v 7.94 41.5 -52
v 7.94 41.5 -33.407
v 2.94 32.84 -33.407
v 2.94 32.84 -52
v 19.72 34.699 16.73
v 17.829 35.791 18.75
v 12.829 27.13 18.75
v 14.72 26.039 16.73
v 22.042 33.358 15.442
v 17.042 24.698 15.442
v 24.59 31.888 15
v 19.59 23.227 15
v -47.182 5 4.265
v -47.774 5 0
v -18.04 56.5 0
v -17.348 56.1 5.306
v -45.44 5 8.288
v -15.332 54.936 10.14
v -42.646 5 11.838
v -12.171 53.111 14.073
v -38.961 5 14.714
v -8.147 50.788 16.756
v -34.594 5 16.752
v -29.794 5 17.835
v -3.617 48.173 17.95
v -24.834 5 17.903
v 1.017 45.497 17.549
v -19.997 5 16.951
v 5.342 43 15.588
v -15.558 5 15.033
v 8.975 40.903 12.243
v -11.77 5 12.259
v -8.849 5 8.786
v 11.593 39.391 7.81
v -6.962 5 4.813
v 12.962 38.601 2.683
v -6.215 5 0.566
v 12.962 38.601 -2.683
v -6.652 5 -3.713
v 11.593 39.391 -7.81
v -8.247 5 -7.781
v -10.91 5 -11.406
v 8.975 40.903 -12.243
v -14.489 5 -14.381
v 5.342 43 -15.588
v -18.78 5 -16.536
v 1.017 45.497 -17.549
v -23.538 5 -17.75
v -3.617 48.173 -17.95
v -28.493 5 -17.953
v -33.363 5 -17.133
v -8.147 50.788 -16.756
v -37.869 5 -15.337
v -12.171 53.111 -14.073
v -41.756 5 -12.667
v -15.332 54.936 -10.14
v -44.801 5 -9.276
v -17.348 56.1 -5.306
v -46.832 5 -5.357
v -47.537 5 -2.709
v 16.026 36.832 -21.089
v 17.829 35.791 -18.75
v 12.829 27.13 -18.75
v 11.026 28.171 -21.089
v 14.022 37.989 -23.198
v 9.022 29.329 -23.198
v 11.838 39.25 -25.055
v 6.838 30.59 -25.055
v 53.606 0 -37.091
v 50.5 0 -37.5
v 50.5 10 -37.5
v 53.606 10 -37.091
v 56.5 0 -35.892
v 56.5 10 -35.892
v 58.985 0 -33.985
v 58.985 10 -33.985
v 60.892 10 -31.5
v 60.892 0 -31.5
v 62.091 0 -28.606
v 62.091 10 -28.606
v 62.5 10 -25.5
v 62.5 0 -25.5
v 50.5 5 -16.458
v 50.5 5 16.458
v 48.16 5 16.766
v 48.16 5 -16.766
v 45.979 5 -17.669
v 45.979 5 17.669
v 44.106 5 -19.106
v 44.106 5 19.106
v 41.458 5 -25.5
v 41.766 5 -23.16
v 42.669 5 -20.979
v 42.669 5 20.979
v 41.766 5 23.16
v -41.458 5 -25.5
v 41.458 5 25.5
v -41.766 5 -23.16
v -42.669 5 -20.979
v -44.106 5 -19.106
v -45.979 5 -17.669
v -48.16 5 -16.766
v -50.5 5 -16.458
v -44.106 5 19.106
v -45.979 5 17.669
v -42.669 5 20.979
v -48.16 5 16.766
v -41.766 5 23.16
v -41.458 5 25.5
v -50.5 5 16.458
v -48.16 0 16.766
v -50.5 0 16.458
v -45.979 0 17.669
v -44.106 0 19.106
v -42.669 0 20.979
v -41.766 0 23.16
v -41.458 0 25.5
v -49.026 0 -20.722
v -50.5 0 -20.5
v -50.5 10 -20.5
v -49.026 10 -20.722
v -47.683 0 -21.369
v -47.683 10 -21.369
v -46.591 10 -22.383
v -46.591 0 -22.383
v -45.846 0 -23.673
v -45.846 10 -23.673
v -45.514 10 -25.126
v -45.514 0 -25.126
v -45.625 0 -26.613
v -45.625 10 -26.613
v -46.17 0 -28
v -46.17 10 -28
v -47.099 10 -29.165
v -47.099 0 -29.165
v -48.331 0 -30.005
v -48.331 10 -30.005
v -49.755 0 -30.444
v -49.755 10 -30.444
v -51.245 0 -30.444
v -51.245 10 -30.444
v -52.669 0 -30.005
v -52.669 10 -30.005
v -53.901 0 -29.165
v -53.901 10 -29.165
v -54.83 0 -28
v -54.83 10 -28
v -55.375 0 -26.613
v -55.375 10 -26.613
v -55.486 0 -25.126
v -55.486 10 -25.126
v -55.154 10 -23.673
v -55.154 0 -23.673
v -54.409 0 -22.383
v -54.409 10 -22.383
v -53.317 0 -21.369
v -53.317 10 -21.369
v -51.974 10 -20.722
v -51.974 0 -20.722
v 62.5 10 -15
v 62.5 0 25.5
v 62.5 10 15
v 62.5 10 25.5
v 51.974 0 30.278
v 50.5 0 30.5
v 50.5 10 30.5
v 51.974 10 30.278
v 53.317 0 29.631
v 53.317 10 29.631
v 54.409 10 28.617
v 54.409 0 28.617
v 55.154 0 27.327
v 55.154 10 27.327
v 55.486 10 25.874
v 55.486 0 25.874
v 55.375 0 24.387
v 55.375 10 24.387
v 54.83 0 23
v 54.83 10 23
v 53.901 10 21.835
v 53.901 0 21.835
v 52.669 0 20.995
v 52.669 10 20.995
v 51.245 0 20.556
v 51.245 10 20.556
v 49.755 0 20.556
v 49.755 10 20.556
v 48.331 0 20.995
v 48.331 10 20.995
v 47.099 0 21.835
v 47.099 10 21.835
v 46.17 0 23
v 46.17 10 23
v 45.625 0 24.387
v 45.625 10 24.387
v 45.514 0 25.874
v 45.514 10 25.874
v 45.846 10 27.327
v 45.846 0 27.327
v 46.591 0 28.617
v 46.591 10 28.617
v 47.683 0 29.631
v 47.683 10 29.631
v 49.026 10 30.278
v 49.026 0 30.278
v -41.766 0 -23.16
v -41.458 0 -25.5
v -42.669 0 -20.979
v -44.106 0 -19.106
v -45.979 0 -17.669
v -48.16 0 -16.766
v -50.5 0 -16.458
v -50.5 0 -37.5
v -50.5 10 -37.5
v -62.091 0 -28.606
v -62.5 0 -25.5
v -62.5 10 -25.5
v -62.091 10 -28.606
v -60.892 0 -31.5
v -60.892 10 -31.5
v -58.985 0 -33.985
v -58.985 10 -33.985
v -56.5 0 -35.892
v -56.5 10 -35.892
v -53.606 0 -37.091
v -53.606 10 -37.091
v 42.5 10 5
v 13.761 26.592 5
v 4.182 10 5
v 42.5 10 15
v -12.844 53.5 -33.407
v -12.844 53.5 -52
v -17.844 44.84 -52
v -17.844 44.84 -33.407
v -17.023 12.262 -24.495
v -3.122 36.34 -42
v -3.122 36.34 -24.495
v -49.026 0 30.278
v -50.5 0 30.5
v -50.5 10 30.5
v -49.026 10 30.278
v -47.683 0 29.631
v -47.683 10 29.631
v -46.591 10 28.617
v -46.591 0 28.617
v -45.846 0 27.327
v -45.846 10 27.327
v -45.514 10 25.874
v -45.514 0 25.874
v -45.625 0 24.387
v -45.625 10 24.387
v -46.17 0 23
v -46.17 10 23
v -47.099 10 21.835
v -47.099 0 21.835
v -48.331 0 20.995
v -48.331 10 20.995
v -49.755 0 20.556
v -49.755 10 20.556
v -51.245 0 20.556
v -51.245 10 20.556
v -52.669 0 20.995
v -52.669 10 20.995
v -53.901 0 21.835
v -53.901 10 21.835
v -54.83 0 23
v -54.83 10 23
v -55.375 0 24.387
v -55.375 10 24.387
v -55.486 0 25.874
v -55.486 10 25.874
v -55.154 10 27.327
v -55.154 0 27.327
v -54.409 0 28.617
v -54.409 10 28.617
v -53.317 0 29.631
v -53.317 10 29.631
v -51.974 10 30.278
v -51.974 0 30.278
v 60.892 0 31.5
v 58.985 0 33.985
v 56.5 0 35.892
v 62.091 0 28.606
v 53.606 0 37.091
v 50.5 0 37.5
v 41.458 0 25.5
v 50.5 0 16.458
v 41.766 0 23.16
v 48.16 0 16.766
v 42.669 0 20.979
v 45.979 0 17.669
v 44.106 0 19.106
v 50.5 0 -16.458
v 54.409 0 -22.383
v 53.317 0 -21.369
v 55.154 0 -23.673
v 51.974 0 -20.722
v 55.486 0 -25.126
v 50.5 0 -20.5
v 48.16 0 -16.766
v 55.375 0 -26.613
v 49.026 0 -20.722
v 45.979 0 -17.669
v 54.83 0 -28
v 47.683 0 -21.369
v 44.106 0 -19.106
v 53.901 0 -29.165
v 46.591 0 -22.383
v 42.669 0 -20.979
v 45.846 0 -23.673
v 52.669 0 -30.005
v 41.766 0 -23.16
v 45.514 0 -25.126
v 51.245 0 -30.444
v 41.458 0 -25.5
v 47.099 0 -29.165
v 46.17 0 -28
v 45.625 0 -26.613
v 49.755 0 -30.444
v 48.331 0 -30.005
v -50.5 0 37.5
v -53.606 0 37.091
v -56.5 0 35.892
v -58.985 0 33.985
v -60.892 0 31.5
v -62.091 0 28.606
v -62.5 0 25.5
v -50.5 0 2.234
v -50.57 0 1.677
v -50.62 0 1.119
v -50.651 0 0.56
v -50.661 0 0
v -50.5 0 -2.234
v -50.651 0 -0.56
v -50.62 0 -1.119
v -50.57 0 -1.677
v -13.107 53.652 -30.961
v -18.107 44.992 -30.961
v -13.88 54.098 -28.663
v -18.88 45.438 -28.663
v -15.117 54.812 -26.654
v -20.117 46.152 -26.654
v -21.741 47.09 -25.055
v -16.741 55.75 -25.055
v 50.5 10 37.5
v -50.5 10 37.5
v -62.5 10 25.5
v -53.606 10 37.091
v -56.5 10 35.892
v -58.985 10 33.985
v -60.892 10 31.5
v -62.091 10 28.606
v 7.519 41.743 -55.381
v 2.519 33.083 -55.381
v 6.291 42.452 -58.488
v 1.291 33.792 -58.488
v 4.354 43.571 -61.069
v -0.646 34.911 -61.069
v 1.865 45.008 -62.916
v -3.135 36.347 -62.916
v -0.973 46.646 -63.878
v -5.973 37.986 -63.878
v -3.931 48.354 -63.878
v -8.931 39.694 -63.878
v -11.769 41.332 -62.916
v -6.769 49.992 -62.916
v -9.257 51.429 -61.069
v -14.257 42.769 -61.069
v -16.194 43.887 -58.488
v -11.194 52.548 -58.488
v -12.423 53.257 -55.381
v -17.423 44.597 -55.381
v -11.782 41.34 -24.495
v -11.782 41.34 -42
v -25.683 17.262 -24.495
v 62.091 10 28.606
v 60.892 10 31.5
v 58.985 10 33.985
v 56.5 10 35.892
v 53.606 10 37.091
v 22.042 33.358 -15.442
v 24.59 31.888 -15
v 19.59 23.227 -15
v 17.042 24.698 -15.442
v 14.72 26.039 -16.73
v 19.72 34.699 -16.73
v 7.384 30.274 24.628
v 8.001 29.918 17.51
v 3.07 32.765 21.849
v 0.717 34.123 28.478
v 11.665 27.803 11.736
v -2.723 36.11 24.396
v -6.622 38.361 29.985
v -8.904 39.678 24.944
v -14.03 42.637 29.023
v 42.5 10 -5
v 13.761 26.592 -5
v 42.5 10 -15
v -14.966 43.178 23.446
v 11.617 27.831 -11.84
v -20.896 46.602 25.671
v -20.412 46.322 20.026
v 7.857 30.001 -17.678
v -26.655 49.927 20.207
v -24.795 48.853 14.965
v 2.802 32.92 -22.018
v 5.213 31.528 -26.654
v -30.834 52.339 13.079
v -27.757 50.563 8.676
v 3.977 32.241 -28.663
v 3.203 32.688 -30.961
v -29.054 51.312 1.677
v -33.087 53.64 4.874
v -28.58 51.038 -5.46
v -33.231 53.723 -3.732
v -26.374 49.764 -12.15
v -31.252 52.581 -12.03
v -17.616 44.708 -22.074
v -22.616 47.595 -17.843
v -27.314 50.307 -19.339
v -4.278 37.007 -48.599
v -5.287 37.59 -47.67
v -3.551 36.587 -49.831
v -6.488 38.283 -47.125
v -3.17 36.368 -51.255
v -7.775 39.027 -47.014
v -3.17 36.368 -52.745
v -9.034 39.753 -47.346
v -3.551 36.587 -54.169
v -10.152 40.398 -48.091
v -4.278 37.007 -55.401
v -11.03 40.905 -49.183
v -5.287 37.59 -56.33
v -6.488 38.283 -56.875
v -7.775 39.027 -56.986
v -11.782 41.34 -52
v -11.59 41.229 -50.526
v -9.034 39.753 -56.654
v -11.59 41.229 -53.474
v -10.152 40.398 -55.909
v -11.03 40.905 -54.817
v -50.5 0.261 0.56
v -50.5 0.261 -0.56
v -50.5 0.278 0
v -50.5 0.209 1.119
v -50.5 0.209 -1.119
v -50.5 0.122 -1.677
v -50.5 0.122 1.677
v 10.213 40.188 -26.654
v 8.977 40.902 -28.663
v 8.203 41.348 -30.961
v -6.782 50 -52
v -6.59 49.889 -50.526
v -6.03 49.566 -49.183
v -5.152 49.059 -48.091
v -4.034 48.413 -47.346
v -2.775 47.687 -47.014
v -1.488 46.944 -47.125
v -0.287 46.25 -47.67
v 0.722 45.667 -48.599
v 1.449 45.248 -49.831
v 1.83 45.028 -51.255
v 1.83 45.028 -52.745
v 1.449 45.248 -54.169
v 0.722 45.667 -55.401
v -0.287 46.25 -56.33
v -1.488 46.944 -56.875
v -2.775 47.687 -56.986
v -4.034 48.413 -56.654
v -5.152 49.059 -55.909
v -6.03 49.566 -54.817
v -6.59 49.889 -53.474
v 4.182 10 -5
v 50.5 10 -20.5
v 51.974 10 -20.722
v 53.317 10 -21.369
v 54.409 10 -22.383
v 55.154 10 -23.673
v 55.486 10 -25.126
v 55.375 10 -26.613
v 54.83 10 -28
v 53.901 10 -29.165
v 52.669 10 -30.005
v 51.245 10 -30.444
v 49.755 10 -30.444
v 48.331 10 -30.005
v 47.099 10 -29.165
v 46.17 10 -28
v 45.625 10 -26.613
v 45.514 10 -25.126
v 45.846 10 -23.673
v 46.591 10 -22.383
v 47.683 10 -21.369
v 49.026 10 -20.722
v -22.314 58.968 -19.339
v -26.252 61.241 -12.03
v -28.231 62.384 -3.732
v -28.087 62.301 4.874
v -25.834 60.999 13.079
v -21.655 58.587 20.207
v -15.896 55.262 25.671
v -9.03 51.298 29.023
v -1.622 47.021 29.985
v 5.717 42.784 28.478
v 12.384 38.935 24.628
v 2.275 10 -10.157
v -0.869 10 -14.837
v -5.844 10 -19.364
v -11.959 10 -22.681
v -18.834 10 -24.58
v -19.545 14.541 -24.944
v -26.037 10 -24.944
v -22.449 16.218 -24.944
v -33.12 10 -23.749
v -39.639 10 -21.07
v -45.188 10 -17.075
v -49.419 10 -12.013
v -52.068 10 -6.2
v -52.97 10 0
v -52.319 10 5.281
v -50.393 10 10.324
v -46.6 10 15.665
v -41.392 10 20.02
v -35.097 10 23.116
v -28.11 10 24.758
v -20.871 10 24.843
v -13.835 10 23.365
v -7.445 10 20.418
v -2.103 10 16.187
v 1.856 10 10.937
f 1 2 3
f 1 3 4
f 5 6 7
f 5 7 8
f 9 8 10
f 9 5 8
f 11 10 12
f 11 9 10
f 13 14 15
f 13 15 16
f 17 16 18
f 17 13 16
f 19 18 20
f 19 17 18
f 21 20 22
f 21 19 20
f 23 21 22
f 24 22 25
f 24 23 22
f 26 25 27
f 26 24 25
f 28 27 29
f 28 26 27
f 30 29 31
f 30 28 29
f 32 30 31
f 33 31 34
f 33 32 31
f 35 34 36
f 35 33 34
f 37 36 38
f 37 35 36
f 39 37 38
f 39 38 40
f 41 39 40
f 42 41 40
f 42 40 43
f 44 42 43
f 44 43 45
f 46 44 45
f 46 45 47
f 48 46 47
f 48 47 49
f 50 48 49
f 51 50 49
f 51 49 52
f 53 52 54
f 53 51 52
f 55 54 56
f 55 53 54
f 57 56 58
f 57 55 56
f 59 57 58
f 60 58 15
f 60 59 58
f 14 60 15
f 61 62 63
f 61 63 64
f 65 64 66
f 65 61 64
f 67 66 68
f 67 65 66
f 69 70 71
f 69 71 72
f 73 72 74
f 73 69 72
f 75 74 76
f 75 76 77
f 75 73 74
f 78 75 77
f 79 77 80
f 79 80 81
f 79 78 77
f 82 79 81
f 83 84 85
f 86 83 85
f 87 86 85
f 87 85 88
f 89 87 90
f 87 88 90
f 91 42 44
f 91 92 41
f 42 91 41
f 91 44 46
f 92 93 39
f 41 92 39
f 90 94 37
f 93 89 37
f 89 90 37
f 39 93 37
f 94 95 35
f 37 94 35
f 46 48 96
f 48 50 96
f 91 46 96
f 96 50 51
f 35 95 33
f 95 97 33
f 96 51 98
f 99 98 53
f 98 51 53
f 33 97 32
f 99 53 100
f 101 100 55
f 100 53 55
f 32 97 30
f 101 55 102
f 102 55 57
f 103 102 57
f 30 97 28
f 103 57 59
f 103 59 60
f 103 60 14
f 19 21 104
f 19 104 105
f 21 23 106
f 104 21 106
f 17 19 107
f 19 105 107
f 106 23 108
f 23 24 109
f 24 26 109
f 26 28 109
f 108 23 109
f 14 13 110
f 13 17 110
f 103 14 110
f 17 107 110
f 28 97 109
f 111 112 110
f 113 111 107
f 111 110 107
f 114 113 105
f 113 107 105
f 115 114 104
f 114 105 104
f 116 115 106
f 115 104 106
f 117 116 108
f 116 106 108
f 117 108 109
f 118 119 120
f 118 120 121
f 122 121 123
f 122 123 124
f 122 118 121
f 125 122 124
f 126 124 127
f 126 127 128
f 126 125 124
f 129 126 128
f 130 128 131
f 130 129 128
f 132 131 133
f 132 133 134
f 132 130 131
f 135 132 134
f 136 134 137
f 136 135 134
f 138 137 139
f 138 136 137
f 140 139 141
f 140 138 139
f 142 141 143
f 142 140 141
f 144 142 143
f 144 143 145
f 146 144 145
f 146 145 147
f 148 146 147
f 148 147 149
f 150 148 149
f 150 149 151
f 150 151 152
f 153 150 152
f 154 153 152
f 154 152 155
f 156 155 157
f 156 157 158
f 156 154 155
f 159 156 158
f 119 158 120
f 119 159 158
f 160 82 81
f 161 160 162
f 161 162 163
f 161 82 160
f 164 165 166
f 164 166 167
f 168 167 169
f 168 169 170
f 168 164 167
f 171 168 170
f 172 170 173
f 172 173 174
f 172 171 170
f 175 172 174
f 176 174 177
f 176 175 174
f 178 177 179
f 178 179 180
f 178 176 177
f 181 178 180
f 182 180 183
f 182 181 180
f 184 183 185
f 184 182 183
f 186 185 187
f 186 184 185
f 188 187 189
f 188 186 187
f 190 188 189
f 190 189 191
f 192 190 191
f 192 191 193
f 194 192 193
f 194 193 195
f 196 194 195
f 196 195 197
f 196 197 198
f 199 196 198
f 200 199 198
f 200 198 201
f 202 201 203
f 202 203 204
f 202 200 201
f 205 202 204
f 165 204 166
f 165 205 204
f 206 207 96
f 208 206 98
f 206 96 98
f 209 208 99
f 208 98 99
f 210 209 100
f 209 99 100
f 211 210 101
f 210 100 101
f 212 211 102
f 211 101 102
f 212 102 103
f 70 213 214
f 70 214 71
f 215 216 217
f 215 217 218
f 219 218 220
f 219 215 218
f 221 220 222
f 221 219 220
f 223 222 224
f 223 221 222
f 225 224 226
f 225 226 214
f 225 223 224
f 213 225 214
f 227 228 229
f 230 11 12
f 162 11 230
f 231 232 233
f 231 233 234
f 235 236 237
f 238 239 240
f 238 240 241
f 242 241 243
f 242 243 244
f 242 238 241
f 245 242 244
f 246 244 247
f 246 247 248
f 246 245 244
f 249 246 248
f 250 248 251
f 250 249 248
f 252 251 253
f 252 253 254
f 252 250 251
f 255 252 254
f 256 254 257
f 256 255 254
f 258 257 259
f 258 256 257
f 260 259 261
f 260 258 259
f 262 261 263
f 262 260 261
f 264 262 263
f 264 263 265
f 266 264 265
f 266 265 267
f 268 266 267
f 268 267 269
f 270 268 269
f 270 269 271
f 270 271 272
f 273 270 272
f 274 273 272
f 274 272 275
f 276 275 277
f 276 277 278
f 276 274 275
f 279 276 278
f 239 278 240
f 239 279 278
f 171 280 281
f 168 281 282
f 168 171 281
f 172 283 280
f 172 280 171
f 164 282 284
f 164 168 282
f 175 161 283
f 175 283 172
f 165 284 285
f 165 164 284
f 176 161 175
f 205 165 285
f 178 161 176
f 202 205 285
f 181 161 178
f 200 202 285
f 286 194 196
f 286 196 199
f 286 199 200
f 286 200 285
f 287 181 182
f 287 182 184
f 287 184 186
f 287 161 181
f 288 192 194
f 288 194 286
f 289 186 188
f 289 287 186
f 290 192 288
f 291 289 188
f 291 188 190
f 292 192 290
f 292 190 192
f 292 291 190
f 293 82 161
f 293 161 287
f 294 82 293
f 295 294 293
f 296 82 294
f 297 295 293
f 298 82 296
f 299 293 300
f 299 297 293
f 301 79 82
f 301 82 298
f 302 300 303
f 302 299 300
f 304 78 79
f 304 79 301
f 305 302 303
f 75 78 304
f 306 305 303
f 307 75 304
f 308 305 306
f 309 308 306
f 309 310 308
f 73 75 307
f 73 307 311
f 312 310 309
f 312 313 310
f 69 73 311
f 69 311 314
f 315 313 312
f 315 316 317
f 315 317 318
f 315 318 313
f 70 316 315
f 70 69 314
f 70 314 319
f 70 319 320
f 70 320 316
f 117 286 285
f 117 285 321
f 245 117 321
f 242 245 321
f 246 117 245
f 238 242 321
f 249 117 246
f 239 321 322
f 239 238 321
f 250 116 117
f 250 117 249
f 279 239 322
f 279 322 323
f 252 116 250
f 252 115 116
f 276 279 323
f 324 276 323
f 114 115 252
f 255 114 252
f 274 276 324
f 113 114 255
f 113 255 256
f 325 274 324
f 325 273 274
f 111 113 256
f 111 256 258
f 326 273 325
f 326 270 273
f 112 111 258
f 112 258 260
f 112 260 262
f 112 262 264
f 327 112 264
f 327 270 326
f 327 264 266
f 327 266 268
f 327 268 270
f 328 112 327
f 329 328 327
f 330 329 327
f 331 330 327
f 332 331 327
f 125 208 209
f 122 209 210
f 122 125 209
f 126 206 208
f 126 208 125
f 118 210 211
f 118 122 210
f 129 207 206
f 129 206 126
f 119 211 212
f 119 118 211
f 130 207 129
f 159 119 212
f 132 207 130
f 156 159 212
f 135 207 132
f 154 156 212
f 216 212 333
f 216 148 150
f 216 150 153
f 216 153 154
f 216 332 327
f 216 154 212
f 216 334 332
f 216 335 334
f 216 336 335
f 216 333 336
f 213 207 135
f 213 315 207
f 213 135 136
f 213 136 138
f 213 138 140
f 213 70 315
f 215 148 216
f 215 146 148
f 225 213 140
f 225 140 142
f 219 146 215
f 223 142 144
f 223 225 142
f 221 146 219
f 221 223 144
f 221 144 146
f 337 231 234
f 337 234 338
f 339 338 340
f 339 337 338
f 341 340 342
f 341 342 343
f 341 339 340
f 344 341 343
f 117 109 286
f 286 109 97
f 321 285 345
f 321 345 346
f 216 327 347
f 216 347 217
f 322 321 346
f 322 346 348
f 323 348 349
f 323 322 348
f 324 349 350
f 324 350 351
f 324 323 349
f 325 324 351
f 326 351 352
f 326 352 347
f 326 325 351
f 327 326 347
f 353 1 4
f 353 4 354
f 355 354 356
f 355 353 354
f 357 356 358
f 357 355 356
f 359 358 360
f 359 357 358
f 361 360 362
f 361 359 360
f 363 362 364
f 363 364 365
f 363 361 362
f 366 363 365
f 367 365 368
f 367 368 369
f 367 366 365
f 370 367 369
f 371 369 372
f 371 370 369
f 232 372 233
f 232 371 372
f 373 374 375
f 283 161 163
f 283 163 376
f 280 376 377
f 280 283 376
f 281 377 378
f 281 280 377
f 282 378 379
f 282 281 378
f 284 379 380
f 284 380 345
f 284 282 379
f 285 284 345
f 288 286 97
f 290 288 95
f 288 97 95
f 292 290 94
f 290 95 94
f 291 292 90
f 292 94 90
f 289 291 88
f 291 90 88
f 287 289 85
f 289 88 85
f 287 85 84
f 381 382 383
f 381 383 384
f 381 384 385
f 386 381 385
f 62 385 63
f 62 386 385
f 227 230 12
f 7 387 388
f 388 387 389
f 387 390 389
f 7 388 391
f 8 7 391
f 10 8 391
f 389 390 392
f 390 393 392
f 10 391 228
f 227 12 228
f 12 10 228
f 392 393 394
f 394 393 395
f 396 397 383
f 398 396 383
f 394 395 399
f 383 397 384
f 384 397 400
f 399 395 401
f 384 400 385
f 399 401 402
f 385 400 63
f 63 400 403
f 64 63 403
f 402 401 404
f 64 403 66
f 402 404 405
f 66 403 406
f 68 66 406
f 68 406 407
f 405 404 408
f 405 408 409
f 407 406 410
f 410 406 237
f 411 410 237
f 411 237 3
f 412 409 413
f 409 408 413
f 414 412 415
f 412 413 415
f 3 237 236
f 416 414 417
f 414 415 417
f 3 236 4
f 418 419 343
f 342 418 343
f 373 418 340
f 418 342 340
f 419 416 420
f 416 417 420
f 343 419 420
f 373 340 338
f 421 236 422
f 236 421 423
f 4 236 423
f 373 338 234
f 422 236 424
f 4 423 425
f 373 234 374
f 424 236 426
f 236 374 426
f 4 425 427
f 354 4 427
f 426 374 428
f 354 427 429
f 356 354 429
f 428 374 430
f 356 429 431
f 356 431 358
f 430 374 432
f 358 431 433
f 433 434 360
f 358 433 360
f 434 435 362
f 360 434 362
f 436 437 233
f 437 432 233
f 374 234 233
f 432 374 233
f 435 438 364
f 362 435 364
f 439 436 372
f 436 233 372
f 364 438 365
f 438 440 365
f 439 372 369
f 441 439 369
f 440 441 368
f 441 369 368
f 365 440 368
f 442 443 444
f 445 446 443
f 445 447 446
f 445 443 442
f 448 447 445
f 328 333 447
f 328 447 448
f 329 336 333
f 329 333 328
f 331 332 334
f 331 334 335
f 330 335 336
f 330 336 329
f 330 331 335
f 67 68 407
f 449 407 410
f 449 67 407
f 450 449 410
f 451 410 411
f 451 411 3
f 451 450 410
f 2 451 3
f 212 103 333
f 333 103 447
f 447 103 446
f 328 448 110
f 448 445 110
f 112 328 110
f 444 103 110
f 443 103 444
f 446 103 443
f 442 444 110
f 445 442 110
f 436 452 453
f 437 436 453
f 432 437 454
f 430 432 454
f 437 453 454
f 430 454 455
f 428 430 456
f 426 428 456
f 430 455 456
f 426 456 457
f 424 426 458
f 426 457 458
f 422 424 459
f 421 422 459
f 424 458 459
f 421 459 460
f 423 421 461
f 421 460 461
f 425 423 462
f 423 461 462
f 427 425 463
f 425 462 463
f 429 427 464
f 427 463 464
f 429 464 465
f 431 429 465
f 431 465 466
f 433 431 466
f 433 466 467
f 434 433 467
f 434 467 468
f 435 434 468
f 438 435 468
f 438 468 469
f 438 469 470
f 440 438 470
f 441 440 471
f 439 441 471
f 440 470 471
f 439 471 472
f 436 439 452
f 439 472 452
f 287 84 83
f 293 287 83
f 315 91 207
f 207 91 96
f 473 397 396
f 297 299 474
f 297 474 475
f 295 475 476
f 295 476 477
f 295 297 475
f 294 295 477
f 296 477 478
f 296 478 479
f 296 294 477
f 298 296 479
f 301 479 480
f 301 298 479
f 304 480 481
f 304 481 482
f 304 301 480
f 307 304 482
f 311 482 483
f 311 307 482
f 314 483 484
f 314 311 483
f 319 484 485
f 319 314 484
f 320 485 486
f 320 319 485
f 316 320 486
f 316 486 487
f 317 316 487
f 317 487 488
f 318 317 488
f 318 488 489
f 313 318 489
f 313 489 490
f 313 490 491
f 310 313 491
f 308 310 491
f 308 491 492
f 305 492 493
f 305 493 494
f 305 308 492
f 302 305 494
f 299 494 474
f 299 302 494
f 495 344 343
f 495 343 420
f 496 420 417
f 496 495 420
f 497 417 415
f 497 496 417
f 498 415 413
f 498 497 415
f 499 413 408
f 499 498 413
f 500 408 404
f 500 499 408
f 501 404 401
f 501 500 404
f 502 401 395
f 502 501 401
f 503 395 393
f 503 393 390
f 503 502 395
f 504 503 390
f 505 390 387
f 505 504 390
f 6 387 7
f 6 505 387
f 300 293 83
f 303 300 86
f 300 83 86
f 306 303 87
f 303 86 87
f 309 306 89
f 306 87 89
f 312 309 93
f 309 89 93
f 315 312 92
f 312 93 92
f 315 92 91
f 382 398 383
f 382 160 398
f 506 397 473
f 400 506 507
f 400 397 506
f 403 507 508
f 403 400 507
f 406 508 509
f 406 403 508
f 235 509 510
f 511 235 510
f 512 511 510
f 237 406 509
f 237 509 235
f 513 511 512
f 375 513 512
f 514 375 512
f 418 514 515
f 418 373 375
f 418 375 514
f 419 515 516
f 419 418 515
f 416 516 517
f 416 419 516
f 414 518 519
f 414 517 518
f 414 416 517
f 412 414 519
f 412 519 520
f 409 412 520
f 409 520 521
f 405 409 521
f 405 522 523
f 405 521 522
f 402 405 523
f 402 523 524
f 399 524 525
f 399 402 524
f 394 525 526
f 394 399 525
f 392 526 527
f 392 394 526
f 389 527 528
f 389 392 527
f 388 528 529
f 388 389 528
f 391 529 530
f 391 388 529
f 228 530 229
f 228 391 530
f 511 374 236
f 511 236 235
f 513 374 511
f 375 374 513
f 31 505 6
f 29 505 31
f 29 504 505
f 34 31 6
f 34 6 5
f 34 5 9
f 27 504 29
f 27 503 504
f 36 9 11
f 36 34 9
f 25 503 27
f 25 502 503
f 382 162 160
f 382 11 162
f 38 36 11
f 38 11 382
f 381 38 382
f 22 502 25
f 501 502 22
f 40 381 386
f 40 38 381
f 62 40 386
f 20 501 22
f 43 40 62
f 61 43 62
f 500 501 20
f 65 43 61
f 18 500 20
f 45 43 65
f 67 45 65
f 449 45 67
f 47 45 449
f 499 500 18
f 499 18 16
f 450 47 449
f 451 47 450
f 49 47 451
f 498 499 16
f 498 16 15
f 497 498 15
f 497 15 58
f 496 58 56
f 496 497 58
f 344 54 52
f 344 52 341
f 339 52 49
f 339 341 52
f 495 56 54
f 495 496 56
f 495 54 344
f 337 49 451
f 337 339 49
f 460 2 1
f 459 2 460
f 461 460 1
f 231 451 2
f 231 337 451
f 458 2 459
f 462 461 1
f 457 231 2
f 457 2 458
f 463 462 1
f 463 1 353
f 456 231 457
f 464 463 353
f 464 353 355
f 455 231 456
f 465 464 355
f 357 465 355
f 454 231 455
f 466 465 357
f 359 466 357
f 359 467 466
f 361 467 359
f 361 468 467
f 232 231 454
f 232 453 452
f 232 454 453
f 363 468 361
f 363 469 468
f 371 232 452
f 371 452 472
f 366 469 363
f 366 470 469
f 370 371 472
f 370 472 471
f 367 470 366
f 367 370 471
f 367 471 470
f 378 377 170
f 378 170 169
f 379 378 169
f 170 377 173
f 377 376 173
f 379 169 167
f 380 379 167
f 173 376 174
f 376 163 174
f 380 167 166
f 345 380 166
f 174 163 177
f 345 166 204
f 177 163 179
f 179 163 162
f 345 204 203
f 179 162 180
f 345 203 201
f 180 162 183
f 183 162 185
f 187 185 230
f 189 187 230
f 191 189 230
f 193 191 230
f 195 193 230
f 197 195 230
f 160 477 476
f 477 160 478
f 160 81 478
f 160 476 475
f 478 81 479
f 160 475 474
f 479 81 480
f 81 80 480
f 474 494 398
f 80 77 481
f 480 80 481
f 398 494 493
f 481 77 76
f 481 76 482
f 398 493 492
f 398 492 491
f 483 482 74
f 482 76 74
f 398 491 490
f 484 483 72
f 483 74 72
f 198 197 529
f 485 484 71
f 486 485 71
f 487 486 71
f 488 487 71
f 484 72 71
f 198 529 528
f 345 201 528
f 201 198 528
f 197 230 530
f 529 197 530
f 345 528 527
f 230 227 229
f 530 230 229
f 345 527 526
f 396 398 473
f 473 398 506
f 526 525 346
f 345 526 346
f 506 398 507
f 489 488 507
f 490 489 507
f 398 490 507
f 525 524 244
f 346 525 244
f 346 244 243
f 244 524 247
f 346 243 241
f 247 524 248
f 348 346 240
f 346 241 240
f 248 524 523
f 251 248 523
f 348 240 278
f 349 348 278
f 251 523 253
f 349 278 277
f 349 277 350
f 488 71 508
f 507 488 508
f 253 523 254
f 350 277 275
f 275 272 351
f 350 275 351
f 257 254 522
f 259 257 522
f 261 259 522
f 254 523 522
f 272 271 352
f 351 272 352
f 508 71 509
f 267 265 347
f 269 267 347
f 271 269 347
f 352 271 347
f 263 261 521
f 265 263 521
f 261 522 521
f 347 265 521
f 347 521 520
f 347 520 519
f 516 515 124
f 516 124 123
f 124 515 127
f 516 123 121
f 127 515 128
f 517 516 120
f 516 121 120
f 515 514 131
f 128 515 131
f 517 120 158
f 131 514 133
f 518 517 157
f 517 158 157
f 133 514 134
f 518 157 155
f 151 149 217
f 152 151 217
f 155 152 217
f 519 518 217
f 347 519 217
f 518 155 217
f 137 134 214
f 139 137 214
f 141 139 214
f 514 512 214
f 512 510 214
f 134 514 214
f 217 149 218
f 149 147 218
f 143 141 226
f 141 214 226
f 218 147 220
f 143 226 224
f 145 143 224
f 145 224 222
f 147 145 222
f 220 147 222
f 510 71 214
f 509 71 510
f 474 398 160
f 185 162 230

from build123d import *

# Parameters (mm, degrees)
SKETCH_1_R               = 5
EXTRUDE_1_DEPTH          = 10
SKETCH_3_R               = 25
SKETCH_3_R_2             = 5
EXTRUDE_4_DEPTH          = 10
EXTRUDE_5_REACH          = 111.952
SKETCH_11_R              = 25
CUT_EXTRUDE_5_DEPTH      = 110.952122557
CUT_EXTRUDE_5_DEPTH_BACK = 110.952122557
SKETCH_13_R              = 18
RIB_2_REACH              = 111.126
SKETCH_14_WALL_W         = 252.93163968
SKETCH_14_WALL_H         = 10
CUT_EXTRUDE_6_DEPTH      = 110.126073878
CUT_EXTRUDE_6_DEPTH_BACK = 5
RIB_3_REACH              = 119.31
SKETCH_18_WALL_W         = 268.526863554
SKETCH_18_WALL_H         = 10


with BuildPart() as part:
    # 草图1 → 凸台-拉伸1 (new body)
    with BuildSketch(Plane(origin=(0, 0, 0), x_dir=(1, 0, 0), z_dir=(0, 1, 0))):
        with BuildLine():
            Line((-50.5, 37.5), (50.5, 37.5))
            ThreePointArc((50.5, 37.5), (58.985281374, 33.985281374), (62.5, 25.5))
            Line((62.5, 25.5), (62.5, -25.5))
            ThreePointArc((62.5, -25.5), (58.985281374, -33.985281374), (50.5, -37.5))
            Line((50.5, -37.5), (-50.5, -37.5))
            ThreePointArc((-50.5, -37.5), (-58.985281374, -33.985281374), (-62.5, -25.5))
            Line((-62.5, -25.5), (-62.5, 25.5))
            ThreePointArc((-62.5, 25.5), (-58.985281374, 33.985281374), (-50.5, 37.5))
        make_face()
        with Locations(Location((50.5, -25.5, 0), (0, 0, 270))):
            Circle(SKETCH_1_R, mode=Mode.SUBTRACT)
        with Locations(Location((50.5, 25.5, 0), (0, 0, 270))):
            Circle(SKETCH_1_R, mode=Mode.SUBTRACT)
        with Locations(Location((-50.5, 25.5, 0), (0, 0, 270))):
            Circle(SKETCH_1_R, mode=Mode.SUBTRACT)
        with Locations(Location((-50.5, -25.5, 0), (0, 0, 270))):
            Circle(SKETCH_1_R, mode=Mode.SUBTRACT)
    extrude(amount=EXTRUDE_1_DEPTH)

    # 草图3 → 凸台-拉伸4 (add)
    with BuildSketch(Plane(origin=(19.955127019, 34.563293868, 0), x_dir=(0, 0, -1), z_dir=(0.500000000000001, 0.866025403784438, 0))):
        with BuildLine():
            Line((-15, -49.126587737), (15, -49.126587737))
            Line((15, -49.126587737), (15, -5.351577729))
            ThreePointArc((15, -5.351577729), (15.986121811, -1.02145071), (18.75, 2.454669769))
            ThreePointArc((18.75, 2.454669769), (22.173981002, 5.666617205), (25.054939633, 9.373412263))
            ThreePointArc((25.054939633, 9.373412263), (28.663169687, 12.676820694), (33.406586177, 13.873412263))
            Line((33.406586177, 13.873412263), (52, 13.873412263))
            ThreePointArc((52, 13.873412263), (64, 25.873412263), (52, 37.873412263))
            Line((52, 37.873412263), (33.406586177, 37.873412263))
            ThreePointArc((33.406586177, 37.873412263), (28.663169687, 39.070003833), (25.054939633, 42.373412263))
            ThreePointArc((25.054939633, 42.373412263), (-20.206795058, 48.047393266), (-18.75, 2.454669769))
            ThreePointArc((-18.75, 2.454669769), (-15.986121811, -1.02145071), (-15, -5.351577729))
            Line((-15, -5.351577729), (-15, -49.126587737))
        make_face()
        with Locations(Location((0, 25.873412263, 0), (0, 0, 90))):
            Circle(SKETCH_3_R, mode=Mode.SUBTRACT)
        with Locations(Location((52, 25.873412263, 0), (0, 0, 90))):
            Circle(SKETCH_3_R_2, mode=Mode.SUBTRACT)
    extrude(amount=-EXTRUDE_4_DEPTH)

    # 凸台-拉伸5: up to this plane
    extrude_5_end = Plane(origin=(50.5, 10, -25.5), z_dir=(0, -1, 0))
    # 草图11 → 凸台-拉伸5 (add, up to the surface)
    with BuildSketch(Plane(origin=(19.955127019, 34.563293868, 0), x_dir=(0.8660254037844382, -0.500000000000001, 0), z_dir=(0.500000000000001, 0.8660254037844382, 0)), mode=Mode.PRIVATE) as extrude_5_sk1:
        with Locations(Location((-25.873412263, 0, 0), (0, 0, 180))):
            Circle(SKETCH_11_R)
    extrude_5_tool1 = split(extrude(extrude_5_sk1.sketch, amount=-EXTRUDE_5_REACH, mode=Mode.PRIVATE), bisect_by=extrude_5_end, keep=Keep.BOTH, mode=Mode.PRIVATE)
    add(extrude_5_tool1.solids().sort_by_distance((-2.451905, 47.5, 0))[0])

    # 草图13 → 切除-拉伸5 (cut, two sides: drawn at the far end of the back side and taken through both)
    with BuildSketch(Plane(origin=(19.955127019, 34.563293868, 0), x_dir=(0, 0, -1), z_dir=(0.500000000000001, 0.866025403784438, 0)).offset(-CUT_EXTRUDE_5_DEPTH_BACK)):
        with Locations(Location((0, 25.873412263, 0), (0, 0, 90))):
            Circle(SKETCH_13_R)
    extrude(amount=CUT_EXTRUDE_5_DEPTH + CUT_EXTRUDE_5_DEPTH_BACK, mode=Mode.SUBTRACT)

    # 草图14 wall → 筋2 (add, up to next)
    with BuildSketch(Plane(origin=(28.349364905, 18.169872981, 0), x_dir=(0.866025403785, -0.499999999999, 0), z_dir=(0.499999999999, 0.866025403785, 0)), mode=Mode.PRIVATE) as rib_2_sk1:
        Rectangle(SKETCH_14_WALL_W, SKETCH_14_WALL_H)
    rib_2_tool1 = extrude(rib_2_sk1.sketch, amount=-RIB_2_REACH, mode=Mode.PRIVATE) - part.part
    add(rib_2_tool1.solids().sort_by_distance((28.349364905, 18.169872981, 0))[0])

    # 草图15 → 切除-拉伸6 (cut, two sides: drawn at the far end of the back side and taken through both)
    with BuildSketch(Plane.XZ.offset(-CUT_EXTRUDE_6_DEPTH_BACK)):
        with BuildLine():
            Line((-41.457999039, 25.5), (41.457999039, 25.5))
            ThreePointArc((41.457999039, 25.5), (44.106339805, 19.106339805), (50.5, 16.457999039))
            Line((50.5, 16.457999039), (50.5, -16.457999039))
            ThreePointArc((50.5, -16.457999039), (44.106339805, -19.106339805), (41.457999039, -25.5))
            Line((41.457999039, -25.5), (-41.457999039, -25.5))
            ThreePointArc((-41.457999039, -25.5), (-44.106339805, -19.106339805), (-50.5, -16.457999039))
            Line((-50.5, -16.457999039), (-50.5, 16.457999039))
            ThreePointArc((-50.5, 16.457999039), (-44.106339805, 19.106339805), (-41.457999039, 25.5))
        make_face()
    extrude(amount=CUT_EXTRUDE_6_DEPTH + CUT_EXTRUDE_6_DEPTH_BACK, mode=Mode.SUBTRACT)

    # 草图18 wall → 筋3 (add, up to next)
    with BuildSketch(Plane(origin=(-14.201905284, 27.148403011, -33.5), x_dir=(-0.423116420047, -0.732859137032, 0.532813269688), z_dir=(-0.266406634844, -0.461429827024, -0.846232840088)), mode=Mode.PRIVATE) as rib_3_sk1:
        Rectangle(SKETCH_18_WALL_W, SKETCH_18_WALL_H)
    rib_3_tool1 = extrude(rib_3_sk1.sketch, amount=-RIB_3_REACH, mode=Mode.PRIVATE) - part.part
    add(rib_3_tool1.solids().sort_by_distance((-14.201905284, 27.148403011, -33.5))[0])


solid = part.part
